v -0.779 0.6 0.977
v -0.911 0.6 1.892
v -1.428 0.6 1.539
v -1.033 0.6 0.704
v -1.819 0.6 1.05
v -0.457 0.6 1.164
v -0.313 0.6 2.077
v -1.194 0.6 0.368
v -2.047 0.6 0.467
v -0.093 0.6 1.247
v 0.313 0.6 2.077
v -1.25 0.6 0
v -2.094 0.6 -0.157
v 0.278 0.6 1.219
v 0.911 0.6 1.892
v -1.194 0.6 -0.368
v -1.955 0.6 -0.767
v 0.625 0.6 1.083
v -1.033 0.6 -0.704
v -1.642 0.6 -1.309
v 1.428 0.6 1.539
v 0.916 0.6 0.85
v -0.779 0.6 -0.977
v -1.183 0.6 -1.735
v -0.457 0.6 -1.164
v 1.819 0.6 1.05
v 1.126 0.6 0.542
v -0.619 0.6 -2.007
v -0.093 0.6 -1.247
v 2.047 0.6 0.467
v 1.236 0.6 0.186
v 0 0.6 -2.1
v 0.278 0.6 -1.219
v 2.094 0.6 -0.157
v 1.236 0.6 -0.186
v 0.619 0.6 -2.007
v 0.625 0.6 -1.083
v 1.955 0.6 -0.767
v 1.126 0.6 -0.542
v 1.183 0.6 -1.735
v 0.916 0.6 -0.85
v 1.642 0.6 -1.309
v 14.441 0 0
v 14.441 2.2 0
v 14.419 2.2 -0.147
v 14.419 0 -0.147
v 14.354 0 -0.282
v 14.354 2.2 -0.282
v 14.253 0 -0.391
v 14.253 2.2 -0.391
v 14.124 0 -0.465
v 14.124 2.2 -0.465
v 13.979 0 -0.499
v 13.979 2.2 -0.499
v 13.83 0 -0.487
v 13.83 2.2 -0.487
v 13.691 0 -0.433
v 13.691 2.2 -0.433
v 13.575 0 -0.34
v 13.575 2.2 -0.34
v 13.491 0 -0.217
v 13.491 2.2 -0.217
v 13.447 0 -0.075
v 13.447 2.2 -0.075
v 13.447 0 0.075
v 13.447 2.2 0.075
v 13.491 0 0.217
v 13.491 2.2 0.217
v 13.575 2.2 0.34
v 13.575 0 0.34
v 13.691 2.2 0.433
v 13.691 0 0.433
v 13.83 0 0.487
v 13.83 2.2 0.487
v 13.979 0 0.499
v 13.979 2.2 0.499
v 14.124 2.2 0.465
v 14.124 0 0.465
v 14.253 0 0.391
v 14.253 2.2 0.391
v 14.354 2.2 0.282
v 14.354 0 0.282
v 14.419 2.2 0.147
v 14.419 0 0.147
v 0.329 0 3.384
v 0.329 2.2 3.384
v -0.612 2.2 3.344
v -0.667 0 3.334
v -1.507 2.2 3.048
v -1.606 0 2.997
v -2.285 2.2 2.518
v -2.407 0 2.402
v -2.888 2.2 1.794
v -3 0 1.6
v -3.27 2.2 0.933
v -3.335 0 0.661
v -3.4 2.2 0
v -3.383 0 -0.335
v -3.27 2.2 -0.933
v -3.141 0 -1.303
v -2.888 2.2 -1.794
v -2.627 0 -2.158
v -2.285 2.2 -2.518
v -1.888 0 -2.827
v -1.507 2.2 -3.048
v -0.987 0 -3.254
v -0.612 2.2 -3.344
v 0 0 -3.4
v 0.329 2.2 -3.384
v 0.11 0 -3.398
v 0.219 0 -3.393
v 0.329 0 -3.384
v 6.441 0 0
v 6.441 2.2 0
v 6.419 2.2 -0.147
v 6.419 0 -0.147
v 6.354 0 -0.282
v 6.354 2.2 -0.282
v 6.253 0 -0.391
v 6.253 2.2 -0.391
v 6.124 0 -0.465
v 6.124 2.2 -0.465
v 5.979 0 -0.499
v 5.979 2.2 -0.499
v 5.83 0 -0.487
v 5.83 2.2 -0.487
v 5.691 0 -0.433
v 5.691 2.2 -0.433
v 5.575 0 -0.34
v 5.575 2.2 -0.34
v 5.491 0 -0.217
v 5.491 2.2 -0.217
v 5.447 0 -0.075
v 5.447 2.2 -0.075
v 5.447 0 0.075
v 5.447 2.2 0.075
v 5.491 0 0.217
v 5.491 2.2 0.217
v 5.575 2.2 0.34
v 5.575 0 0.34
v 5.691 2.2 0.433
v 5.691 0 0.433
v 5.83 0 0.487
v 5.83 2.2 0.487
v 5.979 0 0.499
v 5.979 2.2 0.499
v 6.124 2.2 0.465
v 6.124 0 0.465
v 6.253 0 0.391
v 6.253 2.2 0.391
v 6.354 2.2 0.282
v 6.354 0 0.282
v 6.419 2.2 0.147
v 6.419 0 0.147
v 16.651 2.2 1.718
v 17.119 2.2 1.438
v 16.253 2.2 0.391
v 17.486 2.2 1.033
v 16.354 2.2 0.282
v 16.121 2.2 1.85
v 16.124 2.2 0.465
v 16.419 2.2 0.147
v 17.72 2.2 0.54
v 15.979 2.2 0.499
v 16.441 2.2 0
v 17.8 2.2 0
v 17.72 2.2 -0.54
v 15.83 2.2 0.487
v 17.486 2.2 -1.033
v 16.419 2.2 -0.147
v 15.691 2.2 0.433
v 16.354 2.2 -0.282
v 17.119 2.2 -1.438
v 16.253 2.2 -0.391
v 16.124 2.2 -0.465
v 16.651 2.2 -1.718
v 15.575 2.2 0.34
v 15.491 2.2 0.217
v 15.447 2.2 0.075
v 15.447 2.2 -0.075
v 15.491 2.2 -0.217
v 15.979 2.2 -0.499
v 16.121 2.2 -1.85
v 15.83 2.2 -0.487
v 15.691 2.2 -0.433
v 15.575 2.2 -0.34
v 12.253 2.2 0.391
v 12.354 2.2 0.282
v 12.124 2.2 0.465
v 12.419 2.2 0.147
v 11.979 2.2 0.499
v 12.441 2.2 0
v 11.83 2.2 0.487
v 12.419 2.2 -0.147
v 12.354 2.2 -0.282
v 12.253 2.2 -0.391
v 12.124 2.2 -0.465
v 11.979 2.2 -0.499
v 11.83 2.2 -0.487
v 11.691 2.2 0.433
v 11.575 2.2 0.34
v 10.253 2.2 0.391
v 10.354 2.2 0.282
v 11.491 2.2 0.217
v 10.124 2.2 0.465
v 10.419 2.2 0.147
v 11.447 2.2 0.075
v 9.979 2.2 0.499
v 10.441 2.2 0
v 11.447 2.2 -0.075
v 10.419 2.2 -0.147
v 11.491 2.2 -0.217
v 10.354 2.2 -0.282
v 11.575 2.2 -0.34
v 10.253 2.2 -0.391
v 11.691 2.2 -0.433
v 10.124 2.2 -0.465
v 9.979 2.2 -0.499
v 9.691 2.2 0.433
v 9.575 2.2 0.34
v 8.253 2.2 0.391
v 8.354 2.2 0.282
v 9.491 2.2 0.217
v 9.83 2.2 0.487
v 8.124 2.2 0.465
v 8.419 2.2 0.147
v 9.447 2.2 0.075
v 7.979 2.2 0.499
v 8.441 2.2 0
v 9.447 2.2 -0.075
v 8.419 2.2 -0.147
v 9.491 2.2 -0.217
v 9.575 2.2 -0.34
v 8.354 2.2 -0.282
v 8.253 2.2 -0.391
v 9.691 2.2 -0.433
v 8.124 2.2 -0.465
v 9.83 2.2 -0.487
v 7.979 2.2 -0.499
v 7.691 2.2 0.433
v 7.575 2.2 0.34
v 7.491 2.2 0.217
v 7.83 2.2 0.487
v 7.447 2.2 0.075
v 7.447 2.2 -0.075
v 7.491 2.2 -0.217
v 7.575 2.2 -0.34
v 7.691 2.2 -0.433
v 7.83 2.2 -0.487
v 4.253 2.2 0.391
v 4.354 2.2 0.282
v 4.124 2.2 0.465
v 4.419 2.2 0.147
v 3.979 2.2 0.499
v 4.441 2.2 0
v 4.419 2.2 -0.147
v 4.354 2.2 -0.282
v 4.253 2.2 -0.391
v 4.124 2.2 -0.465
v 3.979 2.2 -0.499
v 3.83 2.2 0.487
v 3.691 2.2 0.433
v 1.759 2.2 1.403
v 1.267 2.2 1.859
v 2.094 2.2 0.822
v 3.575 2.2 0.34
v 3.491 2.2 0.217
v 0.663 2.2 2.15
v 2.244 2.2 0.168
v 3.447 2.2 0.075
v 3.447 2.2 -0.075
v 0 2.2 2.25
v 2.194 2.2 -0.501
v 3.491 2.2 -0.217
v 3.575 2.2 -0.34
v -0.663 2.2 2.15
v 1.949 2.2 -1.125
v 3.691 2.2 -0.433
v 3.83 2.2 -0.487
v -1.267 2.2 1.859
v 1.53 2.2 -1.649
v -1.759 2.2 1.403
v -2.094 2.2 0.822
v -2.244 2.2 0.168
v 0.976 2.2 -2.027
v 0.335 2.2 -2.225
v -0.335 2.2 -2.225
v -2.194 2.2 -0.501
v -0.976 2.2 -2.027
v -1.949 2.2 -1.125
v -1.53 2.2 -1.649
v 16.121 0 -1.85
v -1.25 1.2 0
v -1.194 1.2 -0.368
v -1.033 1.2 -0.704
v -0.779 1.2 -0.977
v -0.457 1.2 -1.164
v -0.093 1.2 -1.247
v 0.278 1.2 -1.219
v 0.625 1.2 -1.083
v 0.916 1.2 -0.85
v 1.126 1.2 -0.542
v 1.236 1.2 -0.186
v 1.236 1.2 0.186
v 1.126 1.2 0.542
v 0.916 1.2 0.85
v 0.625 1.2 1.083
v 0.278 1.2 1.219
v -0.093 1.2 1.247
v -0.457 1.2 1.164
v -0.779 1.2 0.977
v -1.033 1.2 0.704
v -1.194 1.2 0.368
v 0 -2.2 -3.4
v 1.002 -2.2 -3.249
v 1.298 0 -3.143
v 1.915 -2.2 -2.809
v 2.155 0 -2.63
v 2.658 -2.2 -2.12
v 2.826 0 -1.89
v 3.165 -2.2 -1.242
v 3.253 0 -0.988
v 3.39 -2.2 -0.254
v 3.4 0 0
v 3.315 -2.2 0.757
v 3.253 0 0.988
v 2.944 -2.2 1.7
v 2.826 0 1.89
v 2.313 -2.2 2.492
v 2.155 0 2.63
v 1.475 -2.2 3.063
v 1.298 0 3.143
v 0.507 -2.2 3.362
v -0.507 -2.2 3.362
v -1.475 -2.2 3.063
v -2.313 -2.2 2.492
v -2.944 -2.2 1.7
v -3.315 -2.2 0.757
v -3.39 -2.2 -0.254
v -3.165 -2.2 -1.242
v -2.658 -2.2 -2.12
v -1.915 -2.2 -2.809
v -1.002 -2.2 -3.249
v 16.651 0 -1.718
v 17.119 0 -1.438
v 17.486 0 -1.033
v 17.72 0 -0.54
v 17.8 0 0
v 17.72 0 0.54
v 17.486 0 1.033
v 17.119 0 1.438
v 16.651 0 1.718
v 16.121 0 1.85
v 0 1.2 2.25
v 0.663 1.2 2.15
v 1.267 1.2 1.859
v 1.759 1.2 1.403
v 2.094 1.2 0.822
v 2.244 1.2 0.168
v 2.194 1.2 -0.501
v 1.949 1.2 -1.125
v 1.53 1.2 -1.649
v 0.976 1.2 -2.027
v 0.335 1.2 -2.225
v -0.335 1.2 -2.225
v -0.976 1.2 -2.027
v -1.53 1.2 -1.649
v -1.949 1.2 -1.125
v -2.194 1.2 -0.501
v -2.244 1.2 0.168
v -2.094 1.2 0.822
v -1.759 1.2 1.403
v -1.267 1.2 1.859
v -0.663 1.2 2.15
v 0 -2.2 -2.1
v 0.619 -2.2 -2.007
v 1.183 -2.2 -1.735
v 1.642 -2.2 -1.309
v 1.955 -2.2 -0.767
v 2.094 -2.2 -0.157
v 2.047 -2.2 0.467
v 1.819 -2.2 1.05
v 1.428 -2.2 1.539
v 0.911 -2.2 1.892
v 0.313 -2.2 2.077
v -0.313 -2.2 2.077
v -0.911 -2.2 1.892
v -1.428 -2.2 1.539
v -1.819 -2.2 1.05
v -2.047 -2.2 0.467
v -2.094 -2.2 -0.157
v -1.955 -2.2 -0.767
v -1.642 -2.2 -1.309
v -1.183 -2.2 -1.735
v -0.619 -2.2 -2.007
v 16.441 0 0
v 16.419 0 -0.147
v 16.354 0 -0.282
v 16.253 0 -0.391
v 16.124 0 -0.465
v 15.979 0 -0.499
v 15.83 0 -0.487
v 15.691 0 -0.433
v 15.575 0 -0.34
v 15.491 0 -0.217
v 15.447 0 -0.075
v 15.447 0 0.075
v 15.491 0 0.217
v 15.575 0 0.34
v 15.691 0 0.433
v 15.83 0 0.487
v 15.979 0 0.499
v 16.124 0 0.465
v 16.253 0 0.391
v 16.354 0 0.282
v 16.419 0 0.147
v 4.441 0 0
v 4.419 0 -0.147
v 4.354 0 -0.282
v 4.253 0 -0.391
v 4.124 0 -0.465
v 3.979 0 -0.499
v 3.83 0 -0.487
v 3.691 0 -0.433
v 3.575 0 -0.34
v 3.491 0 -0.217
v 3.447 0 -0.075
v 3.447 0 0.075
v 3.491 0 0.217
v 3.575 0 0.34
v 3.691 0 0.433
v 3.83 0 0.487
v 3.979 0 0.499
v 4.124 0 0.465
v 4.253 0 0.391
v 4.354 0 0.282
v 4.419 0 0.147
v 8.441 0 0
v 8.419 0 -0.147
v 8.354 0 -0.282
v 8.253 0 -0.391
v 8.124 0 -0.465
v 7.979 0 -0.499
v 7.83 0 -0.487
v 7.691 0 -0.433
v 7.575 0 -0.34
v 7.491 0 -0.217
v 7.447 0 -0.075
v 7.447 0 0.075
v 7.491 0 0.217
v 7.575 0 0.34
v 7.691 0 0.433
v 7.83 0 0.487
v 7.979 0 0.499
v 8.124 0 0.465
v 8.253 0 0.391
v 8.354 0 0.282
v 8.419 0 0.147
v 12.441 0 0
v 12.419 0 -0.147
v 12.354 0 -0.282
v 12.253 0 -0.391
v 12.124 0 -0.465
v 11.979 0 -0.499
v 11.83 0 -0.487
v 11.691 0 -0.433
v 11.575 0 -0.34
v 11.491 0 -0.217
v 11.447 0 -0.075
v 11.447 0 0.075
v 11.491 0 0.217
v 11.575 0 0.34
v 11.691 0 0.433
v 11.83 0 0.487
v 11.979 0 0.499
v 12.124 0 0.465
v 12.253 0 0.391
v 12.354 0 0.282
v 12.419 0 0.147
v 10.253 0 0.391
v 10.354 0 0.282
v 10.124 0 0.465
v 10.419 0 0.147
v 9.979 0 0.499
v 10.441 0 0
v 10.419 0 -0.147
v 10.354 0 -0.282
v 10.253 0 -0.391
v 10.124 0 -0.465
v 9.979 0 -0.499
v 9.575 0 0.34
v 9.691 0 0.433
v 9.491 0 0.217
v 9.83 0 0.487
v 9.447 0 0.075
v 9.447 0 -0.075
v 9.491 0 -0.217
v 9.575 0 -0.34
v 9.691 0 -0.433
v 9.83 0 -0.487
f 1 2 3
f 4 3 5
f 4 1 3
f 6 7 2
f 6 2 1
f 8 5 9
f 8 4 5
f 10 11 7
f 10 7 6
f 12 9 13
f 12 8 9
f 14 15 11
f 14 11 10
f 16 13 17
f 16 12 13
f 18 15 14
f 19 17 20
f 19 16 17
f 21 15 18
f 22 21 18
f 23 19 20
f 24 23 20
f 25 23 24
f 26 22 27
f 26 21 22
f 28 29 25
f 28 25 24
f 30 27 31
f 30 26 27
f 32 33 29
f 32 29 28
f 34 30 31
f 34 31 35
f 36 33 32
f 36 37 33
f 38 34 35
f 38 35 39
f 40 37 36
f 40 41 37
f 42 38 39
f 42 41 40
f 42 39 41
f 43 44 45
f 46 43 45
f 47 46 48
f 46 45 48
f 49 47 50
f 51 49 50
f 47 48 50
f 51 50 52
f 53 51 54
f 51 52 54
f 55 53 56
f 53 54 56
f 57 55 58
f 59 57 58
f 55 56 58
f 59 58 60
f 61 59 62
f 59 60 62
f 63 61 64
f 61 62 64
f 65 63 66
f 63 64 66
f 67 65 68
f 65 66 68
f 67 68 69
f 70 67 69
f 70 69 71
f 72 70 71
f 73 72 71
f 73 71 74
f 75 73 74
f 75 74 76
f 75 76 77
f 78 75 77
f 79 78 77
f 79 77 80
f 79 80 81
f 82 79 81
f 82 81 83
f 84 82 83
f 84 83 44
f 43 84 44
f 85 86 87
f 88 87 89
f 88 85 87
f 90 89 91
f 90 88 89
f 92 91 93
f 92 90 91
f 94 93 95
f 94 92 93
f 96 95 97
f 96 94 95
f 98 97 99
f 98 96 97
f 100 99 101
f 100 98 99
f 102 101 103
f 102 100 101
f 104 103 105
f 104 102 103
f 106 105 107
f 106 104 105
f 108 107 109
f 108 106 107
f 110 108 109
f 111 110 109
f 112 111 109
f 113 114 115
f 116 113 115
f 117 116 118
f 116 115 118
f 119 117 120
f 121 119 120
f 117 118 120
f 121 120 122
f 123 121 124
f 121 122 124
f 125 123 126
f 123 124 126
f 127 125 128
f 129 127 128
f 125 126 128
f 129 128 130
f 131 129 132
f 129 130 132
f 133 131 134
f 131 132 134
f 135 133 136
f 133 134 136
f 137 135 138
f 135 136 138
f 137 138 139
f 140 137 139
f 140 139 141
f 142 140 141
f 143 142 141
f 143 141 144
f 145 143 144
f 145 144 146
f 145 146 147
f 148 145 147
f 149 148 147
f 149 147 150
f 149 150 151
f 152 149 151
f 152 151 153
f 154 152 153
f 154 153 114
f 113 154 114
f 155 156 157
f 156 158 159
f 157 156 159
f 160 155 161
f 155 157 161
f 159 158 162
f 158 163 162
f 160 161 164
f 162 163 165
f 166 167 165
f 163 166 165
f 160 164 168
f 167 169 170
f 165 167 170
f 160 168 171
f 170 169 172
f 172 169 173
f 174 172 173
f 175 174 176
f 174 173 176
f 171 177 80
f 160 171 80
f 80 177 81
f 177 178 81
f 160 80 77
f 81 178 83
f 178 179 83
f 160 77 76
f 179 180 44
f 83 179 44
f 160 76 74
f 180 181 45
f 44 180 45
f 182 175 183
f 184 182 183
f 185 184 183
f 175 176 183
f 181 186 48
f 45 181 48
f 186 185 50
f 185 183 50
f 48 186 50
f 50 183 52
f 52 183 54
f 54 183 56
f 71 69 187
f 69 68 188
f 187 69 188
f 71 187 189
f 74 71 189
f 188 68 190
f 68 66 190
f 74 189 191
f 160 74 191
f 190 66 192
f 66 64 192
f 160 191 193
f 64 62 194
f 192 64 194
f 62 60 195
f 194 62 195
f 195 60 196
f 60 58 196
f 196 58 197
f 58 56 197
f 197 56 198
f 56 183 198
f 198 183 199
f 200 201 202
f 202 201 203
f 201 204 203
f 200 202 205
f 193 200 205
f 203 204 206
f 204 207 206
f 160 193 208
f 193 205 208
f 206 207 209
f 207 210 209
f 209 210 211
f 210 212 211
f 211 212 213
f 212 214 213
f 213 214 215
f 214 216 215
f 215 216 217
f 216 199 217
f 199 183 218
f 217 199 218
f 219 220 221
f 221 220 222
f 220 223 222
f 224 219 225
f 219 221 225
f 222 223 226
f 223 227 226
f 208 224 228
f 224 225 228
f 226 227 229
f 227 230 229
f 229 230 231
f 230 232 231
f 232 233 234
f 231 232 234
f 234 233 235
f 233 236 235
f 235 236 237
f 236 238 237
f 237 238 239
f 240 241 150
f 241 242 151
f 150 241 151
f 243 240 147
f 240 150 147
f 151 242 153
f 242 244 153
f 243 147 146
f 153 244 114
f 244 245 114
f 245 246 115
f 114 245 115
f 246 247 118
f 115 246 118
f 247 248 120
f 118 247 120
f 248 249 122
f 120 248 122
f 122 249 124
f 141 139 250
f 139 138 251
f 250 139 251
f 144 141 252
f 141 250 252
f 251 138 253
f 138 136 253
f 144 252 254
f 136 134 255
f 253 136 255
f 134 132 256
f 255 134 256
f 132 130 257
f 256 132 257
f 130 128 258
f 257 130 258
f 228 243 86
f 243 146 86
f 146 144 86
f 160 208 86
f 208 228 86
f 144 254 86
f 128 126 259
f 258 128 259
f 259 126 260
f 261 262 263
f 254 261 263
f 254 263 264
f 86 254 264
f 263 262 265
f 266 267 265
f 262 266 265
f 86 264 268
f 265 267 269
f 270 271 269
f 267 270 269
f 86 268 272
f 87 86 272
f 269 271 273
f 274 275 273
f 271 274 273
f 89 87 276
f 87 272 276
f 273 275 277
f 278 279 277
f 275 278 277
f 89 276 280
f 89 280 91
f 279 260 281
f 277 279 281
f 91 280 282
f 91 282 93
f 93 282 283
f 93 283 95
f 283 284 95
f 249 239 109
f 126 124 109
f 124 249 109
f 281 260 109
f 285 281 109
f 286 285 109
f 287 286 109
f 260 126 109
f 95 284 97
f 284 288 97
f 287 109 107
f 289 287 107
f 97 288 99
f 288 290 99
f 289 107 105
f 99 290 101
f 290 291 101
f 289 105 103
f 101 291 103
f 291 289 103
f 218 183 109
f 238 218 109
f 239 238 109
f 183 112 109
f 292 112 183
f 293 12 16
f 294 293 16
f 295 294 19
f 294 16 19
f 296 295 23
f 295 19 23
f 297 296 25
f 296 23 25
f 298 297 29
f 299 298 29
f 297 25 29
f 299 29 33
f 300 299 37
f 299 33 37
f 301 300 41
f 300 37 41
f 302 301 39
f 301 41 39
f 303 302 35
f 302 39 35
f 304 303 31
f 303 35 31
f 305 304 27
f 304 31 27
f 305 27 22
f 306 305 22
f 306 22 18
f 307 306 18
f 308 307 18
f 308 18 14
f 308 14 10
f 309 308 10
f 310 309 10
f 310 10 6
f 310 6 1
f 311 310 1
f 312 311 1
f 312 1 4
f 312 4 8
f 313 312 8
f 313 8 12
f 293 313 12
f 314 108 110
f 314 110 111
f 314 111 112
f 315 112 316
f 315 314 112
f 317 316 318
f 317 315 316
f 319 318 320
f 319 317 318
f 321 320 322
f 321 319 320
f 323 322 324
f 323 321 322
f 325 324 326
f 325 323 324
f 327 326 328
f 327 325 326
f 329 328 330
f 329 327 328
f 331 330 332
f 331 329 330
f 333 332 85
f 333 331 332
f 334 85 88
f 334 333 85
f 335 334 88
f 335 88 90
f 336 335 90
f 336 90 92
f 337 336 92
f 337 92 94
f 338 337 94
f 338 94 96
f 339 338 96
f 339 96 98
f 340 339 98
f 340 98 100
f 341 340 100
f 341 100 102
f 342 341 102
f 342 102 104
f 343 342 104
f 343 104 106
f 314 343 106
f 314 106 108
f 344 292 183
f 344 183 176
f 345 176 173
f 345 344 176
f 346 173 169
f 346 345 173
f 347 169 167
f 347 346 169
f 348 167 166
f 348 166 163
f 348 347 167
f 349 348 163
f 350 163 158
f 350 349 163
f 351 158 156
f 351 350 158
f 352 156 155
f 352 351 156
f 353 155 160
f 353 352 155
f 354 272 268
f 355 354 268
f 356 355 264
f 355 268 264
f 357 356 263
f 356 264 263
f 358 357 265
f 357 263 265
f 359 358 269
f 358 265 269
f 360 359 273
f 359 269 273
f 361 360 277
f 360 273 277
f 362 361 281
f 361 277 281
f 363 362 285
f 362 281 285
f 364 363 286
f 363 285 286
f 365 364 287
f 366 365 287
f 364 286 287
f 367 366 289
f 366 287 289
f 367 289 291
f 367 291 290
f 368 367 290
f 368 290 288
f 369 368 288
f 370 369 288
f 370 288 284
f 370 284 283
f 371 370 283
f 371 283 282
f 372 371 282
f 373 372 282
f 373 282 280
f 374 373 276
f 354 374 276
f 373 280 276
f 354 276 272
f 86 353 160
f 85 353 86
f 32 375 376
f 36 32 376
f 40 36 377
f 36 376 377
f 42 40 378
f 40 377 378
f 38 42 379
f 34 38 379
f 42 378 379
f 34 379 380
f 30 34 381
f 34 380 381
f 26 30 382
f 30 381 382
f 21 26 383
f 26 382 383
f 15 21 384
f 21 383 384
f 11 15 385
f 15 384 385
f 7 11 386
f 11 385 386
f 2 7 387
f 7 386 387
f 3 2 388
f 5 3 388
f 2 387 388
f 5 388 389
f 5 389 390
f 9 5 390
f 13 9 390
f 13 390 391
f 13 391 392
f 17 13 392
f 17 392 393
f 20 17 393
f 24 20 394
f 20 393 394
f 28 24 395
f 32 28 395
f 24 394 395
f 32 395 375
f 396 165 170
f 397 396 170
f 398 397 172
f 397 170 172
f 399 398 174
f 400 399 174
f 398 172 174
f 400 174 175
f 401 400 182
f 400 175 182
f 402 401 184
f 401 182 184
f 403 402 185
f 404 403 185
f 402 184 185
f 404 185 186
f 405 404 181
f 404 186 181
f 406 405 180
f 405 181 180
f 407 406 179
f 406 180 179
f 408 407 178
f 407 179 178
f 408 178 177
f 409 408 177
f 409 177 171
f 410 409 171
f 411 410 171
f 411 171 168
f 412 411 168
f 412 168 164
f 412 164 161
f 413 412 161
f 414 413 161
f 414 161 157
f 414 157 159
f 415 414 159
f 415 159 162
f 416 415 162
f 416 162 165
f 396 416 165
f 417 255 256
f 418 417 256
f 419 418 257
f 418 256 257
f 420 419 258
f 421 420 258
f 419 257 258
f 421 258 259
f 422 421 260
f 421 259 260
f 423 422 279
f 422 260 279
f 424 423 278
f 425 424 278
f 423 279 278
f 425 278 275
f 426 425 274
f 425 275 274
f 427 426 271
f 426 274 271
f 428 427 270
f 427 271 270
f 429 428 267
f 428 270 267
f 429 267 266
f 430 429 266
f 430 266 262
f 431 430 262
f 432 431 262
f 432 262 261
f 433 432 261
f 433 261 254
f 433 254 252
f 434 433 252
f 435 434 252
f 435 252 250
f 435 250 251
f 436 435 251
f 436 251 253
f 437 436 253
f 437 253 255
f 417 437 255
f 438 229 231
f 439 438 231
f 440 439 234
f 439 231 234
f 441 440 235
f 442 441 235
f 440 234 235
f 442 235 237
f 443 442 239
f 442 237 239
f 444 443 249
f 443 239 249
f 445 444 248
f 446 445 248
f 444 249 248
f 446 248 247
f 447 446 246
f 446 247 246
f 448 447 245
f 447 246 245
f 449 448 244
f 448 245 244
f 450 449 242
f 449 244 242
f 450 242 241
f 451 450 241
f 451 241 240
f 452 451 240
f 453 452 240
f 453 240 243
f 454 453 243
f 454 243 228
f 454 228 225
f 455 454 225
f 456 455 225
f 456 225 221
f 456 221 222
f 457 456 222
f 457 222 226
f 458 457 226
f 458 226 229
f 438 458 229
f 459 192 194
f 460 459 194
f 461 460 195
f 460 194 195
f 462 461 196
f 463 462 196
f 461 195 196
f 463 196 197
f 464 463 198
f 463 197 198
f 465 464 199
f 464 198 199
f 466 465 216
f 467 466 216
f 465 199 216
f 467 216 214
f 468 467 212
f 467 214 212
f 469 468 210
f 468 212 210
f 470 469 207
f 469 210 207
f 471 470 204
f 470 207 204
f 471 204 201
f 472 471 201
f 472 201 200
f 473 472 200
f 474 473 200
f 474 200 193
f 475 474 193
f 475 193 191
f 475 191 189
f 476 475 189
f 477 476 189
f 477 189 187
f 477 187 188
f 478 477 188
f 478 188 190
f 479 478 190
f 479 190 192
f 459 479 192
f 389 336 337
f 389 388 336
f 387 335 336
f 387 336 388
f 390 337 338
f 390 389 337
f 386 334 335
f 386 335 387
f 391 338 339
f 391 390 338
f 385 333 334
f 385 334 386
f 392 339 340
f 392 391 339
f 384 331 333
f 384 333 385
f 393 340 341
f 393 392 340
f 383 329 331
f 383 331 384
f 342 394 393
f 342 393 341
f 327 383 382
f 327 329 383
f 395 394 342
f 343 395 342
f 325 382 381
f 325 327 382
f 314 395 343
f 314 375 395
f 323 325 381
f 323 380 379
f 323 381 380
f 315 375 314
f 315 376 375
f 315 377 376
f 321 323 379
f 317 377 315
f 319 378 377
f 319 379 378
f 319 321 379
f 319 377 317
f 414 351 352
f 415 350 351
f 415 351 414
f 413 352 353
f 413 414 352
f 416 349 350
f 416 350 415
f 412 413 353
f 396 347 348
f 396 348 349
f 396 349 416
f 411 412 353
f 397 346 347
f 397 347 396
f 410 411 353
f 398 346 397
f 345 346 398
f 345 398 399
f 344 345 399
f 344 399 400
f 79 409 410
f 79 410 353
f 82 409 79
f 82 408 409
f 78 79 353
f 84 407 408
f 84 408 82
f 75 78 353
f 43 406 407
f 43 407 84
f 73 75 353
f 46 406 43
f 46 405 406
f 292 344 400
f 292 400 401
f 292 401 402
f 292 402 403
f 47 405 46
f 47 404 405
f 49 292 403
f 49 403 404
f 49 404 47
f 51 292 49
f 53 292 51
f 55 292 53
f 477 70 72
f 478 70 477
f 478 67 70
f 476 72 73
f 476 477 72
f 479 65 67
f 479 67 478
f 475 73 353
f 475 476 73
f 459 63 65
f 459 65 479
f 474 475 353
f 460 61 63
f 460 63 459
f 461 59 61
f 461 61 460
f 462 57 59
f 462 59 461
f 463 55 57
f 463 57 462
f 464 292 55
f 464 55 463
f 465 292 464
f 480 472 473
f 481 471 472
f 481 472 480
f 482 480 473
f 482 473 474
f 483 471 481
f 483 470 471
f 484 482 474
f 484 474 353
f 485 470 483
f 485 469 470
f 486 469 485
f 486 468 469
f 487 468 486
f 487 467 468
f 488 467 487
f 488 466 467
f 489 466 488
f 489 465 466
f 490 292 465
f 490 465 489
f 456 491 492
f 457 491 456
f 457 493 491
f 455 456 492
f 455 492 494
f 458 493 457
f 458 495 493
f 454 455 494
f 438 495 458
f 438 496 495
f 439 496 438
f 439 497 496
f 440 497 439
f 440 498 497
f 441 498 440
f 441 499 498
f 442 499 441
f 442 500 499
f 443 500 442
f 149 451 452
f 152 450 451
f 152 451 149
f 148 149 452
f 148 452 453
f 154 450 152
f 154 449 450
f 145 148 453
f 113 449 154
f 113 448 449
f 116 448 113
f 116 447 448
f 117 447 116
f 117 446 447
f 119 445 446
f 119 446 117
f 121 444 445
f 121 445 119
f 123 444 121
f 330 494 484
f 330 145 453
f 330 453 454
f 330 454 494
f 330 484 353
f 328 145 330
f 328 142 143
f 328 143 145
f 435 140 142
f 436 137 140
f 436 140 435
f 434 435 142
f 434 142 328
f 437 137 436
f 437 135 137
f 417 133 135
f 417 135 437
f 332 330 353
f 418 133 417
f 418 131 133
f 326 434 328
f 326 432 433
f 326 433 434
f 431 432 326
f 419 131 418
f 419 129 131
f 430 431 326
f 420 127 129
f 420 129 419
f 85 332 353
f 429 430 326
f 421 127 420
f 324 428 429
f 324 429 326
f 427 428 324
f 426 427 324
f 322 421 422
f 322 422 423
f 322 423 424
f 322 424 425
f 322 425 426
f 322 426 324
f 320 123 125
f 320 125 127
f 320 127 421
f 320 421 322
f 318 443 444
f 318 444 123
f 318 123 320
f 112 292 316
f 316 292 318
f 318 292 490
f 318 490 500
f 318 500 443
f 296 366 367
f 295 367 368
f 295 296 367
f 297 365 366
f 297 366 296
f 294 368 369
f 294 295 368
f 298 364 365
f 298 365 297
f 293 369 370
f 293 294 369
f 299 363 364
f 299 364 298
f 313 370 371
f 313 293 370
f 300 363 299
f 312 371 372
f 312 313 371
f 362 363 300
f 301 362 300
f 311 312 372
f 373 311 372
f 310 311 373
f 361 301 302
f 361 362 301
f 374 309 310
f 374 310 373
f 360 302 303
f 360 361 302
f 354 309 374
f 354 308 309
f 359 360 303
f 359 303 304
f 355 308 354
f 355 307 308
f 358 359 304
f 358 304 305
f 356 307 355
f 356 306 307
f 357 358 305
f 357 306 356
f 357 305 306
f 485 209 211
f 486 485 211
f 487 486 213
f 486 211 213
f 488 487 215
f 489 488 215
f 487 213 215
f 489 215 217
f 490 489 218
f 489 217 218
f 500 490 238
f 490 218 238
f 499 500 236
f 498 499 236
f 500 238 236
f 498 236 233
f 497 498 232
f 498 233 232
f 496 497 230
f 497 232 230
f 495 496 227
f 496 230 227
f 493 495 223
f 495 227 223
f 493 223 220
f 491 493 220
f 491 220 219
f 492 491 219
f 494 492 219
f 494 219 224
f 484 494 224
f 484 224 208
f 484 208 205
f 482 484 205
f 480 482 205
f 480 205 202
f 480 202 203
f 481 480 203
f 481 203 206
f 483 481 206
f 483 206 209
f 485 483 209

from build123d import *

# Parameters (mm, degrees)
BOSS_EXTRU_1_DEPTH              = 2.2
BOSS_EXTRU_2_START              = 2.2
ESQUISSE2_R                     = 3.4
BOSS_EXTRU_2_DEPTH              = 2.2
ESQUISSE3_R                     = 2.1
ENL_V_MAT_EXTRU_1_DEPTH         = 2.8
DIAM_TRE_DU_PER_AGE_2_5_2_5_1_D = 2.5
DIAM_TRE_DU_PER_AGE_1_0_1_1_D   = 1
ESQUISSE8_R                     = 2.25
ENL_V_MAT_EXTRU_2_DEPTH         = 1


with BuildPart() as part:
    # Esquisse1 → Boss.-Extru.1 (new body)
    with BuildSketch(Plane(origin=(0, 0, 0), x_dir=(1, 0, 0), z_dir=(0, 1, 0))):
        with BuildLine():
            Line((0.32873073, 3.384070937), (16.121002055, 1.85))
            ThreePointArc((16.121002055, 1.85), (17.8, 0), (16.121002055, -1.85))
            Line((16.121002055, -1.85), (0.32873073, -3.384070937))
            ThreePointArc((0.32873073, -3.384070937), (-3.4, 0), (0.32873073, 3.384070937))
        make_face()
    extrude(amount=BOSS_EXTRU_1_DEPTH)

    # Esquisse2 → Boss.-Extru.2 (add)
    with BuildSketch(Plane.XZ.offset(BOSS_EXTRU_2_START)):
        with Locations(Location((0, 0, 0), (0, 0, 270))):
            Circle(ESQUISSE2_R)
    extrude(amount=-BOSS_EXTRU_2_DEPTH)

    # Esquisse3 → Enlèv. mat.-Extru.1 (cut)
    with BuildSketch(Plane.XZ.offset(2.2)):
        with Locations(Location((0, 0, 0), (0, 0, 270))):
            Circle(ESQUISSE3_R)
    extrude(amount=-ENL_V_MAT_EXTRU_1_DEPTH, mode=Mode.SUBTRACT)

    # Diamètre du perçage Ø2.5 (2.5)1 (through all)
    with Locations(Plane(origin=(0, 2.2, 0), x_dir=(1, 0, 0), z_dir=(0, 1, 0))):
        with Locations((0, 0)):
            Hole(DIAM_TRE_DU_PER_AGE_2_5_2_5_1_D / 2)

    # Diamètre du perçage Ø1.0 (1)1 (through all)
    with Locations(Plane(origin=(0, 0, 0), x_dir=(-1, 0, 0), z_dir=(0, -1, 0))):
        with Locations((-15.941291918, 0), (-13.941291918, 0), (-11.941291918, 0), (-9.941291918, 0), (-7.941291918, 0), (-5.941291918, 0), (-3.941291918, 0)):
            Hole(DIAM_TRE_DU_PER_AGE_1_0_1_1_D / 2)

    # Esquisse8 → Enlèv. mat.-Extru.2 (cut)
    with BuildSketch(Plane(origin=(0, 2.2, 0), x_dir=(1, 0, 0), z_dir=(0, 1, 0))):
        with Locations(Location((0, 0, 0), (0, 0, 270))):
            Circle(ESQUISSE8_R)
    extrude(amount=-ENL_V_MAT_EXTRU_2_DEPTH, mode=Mode.SUBTRACT)


solid = part.part
